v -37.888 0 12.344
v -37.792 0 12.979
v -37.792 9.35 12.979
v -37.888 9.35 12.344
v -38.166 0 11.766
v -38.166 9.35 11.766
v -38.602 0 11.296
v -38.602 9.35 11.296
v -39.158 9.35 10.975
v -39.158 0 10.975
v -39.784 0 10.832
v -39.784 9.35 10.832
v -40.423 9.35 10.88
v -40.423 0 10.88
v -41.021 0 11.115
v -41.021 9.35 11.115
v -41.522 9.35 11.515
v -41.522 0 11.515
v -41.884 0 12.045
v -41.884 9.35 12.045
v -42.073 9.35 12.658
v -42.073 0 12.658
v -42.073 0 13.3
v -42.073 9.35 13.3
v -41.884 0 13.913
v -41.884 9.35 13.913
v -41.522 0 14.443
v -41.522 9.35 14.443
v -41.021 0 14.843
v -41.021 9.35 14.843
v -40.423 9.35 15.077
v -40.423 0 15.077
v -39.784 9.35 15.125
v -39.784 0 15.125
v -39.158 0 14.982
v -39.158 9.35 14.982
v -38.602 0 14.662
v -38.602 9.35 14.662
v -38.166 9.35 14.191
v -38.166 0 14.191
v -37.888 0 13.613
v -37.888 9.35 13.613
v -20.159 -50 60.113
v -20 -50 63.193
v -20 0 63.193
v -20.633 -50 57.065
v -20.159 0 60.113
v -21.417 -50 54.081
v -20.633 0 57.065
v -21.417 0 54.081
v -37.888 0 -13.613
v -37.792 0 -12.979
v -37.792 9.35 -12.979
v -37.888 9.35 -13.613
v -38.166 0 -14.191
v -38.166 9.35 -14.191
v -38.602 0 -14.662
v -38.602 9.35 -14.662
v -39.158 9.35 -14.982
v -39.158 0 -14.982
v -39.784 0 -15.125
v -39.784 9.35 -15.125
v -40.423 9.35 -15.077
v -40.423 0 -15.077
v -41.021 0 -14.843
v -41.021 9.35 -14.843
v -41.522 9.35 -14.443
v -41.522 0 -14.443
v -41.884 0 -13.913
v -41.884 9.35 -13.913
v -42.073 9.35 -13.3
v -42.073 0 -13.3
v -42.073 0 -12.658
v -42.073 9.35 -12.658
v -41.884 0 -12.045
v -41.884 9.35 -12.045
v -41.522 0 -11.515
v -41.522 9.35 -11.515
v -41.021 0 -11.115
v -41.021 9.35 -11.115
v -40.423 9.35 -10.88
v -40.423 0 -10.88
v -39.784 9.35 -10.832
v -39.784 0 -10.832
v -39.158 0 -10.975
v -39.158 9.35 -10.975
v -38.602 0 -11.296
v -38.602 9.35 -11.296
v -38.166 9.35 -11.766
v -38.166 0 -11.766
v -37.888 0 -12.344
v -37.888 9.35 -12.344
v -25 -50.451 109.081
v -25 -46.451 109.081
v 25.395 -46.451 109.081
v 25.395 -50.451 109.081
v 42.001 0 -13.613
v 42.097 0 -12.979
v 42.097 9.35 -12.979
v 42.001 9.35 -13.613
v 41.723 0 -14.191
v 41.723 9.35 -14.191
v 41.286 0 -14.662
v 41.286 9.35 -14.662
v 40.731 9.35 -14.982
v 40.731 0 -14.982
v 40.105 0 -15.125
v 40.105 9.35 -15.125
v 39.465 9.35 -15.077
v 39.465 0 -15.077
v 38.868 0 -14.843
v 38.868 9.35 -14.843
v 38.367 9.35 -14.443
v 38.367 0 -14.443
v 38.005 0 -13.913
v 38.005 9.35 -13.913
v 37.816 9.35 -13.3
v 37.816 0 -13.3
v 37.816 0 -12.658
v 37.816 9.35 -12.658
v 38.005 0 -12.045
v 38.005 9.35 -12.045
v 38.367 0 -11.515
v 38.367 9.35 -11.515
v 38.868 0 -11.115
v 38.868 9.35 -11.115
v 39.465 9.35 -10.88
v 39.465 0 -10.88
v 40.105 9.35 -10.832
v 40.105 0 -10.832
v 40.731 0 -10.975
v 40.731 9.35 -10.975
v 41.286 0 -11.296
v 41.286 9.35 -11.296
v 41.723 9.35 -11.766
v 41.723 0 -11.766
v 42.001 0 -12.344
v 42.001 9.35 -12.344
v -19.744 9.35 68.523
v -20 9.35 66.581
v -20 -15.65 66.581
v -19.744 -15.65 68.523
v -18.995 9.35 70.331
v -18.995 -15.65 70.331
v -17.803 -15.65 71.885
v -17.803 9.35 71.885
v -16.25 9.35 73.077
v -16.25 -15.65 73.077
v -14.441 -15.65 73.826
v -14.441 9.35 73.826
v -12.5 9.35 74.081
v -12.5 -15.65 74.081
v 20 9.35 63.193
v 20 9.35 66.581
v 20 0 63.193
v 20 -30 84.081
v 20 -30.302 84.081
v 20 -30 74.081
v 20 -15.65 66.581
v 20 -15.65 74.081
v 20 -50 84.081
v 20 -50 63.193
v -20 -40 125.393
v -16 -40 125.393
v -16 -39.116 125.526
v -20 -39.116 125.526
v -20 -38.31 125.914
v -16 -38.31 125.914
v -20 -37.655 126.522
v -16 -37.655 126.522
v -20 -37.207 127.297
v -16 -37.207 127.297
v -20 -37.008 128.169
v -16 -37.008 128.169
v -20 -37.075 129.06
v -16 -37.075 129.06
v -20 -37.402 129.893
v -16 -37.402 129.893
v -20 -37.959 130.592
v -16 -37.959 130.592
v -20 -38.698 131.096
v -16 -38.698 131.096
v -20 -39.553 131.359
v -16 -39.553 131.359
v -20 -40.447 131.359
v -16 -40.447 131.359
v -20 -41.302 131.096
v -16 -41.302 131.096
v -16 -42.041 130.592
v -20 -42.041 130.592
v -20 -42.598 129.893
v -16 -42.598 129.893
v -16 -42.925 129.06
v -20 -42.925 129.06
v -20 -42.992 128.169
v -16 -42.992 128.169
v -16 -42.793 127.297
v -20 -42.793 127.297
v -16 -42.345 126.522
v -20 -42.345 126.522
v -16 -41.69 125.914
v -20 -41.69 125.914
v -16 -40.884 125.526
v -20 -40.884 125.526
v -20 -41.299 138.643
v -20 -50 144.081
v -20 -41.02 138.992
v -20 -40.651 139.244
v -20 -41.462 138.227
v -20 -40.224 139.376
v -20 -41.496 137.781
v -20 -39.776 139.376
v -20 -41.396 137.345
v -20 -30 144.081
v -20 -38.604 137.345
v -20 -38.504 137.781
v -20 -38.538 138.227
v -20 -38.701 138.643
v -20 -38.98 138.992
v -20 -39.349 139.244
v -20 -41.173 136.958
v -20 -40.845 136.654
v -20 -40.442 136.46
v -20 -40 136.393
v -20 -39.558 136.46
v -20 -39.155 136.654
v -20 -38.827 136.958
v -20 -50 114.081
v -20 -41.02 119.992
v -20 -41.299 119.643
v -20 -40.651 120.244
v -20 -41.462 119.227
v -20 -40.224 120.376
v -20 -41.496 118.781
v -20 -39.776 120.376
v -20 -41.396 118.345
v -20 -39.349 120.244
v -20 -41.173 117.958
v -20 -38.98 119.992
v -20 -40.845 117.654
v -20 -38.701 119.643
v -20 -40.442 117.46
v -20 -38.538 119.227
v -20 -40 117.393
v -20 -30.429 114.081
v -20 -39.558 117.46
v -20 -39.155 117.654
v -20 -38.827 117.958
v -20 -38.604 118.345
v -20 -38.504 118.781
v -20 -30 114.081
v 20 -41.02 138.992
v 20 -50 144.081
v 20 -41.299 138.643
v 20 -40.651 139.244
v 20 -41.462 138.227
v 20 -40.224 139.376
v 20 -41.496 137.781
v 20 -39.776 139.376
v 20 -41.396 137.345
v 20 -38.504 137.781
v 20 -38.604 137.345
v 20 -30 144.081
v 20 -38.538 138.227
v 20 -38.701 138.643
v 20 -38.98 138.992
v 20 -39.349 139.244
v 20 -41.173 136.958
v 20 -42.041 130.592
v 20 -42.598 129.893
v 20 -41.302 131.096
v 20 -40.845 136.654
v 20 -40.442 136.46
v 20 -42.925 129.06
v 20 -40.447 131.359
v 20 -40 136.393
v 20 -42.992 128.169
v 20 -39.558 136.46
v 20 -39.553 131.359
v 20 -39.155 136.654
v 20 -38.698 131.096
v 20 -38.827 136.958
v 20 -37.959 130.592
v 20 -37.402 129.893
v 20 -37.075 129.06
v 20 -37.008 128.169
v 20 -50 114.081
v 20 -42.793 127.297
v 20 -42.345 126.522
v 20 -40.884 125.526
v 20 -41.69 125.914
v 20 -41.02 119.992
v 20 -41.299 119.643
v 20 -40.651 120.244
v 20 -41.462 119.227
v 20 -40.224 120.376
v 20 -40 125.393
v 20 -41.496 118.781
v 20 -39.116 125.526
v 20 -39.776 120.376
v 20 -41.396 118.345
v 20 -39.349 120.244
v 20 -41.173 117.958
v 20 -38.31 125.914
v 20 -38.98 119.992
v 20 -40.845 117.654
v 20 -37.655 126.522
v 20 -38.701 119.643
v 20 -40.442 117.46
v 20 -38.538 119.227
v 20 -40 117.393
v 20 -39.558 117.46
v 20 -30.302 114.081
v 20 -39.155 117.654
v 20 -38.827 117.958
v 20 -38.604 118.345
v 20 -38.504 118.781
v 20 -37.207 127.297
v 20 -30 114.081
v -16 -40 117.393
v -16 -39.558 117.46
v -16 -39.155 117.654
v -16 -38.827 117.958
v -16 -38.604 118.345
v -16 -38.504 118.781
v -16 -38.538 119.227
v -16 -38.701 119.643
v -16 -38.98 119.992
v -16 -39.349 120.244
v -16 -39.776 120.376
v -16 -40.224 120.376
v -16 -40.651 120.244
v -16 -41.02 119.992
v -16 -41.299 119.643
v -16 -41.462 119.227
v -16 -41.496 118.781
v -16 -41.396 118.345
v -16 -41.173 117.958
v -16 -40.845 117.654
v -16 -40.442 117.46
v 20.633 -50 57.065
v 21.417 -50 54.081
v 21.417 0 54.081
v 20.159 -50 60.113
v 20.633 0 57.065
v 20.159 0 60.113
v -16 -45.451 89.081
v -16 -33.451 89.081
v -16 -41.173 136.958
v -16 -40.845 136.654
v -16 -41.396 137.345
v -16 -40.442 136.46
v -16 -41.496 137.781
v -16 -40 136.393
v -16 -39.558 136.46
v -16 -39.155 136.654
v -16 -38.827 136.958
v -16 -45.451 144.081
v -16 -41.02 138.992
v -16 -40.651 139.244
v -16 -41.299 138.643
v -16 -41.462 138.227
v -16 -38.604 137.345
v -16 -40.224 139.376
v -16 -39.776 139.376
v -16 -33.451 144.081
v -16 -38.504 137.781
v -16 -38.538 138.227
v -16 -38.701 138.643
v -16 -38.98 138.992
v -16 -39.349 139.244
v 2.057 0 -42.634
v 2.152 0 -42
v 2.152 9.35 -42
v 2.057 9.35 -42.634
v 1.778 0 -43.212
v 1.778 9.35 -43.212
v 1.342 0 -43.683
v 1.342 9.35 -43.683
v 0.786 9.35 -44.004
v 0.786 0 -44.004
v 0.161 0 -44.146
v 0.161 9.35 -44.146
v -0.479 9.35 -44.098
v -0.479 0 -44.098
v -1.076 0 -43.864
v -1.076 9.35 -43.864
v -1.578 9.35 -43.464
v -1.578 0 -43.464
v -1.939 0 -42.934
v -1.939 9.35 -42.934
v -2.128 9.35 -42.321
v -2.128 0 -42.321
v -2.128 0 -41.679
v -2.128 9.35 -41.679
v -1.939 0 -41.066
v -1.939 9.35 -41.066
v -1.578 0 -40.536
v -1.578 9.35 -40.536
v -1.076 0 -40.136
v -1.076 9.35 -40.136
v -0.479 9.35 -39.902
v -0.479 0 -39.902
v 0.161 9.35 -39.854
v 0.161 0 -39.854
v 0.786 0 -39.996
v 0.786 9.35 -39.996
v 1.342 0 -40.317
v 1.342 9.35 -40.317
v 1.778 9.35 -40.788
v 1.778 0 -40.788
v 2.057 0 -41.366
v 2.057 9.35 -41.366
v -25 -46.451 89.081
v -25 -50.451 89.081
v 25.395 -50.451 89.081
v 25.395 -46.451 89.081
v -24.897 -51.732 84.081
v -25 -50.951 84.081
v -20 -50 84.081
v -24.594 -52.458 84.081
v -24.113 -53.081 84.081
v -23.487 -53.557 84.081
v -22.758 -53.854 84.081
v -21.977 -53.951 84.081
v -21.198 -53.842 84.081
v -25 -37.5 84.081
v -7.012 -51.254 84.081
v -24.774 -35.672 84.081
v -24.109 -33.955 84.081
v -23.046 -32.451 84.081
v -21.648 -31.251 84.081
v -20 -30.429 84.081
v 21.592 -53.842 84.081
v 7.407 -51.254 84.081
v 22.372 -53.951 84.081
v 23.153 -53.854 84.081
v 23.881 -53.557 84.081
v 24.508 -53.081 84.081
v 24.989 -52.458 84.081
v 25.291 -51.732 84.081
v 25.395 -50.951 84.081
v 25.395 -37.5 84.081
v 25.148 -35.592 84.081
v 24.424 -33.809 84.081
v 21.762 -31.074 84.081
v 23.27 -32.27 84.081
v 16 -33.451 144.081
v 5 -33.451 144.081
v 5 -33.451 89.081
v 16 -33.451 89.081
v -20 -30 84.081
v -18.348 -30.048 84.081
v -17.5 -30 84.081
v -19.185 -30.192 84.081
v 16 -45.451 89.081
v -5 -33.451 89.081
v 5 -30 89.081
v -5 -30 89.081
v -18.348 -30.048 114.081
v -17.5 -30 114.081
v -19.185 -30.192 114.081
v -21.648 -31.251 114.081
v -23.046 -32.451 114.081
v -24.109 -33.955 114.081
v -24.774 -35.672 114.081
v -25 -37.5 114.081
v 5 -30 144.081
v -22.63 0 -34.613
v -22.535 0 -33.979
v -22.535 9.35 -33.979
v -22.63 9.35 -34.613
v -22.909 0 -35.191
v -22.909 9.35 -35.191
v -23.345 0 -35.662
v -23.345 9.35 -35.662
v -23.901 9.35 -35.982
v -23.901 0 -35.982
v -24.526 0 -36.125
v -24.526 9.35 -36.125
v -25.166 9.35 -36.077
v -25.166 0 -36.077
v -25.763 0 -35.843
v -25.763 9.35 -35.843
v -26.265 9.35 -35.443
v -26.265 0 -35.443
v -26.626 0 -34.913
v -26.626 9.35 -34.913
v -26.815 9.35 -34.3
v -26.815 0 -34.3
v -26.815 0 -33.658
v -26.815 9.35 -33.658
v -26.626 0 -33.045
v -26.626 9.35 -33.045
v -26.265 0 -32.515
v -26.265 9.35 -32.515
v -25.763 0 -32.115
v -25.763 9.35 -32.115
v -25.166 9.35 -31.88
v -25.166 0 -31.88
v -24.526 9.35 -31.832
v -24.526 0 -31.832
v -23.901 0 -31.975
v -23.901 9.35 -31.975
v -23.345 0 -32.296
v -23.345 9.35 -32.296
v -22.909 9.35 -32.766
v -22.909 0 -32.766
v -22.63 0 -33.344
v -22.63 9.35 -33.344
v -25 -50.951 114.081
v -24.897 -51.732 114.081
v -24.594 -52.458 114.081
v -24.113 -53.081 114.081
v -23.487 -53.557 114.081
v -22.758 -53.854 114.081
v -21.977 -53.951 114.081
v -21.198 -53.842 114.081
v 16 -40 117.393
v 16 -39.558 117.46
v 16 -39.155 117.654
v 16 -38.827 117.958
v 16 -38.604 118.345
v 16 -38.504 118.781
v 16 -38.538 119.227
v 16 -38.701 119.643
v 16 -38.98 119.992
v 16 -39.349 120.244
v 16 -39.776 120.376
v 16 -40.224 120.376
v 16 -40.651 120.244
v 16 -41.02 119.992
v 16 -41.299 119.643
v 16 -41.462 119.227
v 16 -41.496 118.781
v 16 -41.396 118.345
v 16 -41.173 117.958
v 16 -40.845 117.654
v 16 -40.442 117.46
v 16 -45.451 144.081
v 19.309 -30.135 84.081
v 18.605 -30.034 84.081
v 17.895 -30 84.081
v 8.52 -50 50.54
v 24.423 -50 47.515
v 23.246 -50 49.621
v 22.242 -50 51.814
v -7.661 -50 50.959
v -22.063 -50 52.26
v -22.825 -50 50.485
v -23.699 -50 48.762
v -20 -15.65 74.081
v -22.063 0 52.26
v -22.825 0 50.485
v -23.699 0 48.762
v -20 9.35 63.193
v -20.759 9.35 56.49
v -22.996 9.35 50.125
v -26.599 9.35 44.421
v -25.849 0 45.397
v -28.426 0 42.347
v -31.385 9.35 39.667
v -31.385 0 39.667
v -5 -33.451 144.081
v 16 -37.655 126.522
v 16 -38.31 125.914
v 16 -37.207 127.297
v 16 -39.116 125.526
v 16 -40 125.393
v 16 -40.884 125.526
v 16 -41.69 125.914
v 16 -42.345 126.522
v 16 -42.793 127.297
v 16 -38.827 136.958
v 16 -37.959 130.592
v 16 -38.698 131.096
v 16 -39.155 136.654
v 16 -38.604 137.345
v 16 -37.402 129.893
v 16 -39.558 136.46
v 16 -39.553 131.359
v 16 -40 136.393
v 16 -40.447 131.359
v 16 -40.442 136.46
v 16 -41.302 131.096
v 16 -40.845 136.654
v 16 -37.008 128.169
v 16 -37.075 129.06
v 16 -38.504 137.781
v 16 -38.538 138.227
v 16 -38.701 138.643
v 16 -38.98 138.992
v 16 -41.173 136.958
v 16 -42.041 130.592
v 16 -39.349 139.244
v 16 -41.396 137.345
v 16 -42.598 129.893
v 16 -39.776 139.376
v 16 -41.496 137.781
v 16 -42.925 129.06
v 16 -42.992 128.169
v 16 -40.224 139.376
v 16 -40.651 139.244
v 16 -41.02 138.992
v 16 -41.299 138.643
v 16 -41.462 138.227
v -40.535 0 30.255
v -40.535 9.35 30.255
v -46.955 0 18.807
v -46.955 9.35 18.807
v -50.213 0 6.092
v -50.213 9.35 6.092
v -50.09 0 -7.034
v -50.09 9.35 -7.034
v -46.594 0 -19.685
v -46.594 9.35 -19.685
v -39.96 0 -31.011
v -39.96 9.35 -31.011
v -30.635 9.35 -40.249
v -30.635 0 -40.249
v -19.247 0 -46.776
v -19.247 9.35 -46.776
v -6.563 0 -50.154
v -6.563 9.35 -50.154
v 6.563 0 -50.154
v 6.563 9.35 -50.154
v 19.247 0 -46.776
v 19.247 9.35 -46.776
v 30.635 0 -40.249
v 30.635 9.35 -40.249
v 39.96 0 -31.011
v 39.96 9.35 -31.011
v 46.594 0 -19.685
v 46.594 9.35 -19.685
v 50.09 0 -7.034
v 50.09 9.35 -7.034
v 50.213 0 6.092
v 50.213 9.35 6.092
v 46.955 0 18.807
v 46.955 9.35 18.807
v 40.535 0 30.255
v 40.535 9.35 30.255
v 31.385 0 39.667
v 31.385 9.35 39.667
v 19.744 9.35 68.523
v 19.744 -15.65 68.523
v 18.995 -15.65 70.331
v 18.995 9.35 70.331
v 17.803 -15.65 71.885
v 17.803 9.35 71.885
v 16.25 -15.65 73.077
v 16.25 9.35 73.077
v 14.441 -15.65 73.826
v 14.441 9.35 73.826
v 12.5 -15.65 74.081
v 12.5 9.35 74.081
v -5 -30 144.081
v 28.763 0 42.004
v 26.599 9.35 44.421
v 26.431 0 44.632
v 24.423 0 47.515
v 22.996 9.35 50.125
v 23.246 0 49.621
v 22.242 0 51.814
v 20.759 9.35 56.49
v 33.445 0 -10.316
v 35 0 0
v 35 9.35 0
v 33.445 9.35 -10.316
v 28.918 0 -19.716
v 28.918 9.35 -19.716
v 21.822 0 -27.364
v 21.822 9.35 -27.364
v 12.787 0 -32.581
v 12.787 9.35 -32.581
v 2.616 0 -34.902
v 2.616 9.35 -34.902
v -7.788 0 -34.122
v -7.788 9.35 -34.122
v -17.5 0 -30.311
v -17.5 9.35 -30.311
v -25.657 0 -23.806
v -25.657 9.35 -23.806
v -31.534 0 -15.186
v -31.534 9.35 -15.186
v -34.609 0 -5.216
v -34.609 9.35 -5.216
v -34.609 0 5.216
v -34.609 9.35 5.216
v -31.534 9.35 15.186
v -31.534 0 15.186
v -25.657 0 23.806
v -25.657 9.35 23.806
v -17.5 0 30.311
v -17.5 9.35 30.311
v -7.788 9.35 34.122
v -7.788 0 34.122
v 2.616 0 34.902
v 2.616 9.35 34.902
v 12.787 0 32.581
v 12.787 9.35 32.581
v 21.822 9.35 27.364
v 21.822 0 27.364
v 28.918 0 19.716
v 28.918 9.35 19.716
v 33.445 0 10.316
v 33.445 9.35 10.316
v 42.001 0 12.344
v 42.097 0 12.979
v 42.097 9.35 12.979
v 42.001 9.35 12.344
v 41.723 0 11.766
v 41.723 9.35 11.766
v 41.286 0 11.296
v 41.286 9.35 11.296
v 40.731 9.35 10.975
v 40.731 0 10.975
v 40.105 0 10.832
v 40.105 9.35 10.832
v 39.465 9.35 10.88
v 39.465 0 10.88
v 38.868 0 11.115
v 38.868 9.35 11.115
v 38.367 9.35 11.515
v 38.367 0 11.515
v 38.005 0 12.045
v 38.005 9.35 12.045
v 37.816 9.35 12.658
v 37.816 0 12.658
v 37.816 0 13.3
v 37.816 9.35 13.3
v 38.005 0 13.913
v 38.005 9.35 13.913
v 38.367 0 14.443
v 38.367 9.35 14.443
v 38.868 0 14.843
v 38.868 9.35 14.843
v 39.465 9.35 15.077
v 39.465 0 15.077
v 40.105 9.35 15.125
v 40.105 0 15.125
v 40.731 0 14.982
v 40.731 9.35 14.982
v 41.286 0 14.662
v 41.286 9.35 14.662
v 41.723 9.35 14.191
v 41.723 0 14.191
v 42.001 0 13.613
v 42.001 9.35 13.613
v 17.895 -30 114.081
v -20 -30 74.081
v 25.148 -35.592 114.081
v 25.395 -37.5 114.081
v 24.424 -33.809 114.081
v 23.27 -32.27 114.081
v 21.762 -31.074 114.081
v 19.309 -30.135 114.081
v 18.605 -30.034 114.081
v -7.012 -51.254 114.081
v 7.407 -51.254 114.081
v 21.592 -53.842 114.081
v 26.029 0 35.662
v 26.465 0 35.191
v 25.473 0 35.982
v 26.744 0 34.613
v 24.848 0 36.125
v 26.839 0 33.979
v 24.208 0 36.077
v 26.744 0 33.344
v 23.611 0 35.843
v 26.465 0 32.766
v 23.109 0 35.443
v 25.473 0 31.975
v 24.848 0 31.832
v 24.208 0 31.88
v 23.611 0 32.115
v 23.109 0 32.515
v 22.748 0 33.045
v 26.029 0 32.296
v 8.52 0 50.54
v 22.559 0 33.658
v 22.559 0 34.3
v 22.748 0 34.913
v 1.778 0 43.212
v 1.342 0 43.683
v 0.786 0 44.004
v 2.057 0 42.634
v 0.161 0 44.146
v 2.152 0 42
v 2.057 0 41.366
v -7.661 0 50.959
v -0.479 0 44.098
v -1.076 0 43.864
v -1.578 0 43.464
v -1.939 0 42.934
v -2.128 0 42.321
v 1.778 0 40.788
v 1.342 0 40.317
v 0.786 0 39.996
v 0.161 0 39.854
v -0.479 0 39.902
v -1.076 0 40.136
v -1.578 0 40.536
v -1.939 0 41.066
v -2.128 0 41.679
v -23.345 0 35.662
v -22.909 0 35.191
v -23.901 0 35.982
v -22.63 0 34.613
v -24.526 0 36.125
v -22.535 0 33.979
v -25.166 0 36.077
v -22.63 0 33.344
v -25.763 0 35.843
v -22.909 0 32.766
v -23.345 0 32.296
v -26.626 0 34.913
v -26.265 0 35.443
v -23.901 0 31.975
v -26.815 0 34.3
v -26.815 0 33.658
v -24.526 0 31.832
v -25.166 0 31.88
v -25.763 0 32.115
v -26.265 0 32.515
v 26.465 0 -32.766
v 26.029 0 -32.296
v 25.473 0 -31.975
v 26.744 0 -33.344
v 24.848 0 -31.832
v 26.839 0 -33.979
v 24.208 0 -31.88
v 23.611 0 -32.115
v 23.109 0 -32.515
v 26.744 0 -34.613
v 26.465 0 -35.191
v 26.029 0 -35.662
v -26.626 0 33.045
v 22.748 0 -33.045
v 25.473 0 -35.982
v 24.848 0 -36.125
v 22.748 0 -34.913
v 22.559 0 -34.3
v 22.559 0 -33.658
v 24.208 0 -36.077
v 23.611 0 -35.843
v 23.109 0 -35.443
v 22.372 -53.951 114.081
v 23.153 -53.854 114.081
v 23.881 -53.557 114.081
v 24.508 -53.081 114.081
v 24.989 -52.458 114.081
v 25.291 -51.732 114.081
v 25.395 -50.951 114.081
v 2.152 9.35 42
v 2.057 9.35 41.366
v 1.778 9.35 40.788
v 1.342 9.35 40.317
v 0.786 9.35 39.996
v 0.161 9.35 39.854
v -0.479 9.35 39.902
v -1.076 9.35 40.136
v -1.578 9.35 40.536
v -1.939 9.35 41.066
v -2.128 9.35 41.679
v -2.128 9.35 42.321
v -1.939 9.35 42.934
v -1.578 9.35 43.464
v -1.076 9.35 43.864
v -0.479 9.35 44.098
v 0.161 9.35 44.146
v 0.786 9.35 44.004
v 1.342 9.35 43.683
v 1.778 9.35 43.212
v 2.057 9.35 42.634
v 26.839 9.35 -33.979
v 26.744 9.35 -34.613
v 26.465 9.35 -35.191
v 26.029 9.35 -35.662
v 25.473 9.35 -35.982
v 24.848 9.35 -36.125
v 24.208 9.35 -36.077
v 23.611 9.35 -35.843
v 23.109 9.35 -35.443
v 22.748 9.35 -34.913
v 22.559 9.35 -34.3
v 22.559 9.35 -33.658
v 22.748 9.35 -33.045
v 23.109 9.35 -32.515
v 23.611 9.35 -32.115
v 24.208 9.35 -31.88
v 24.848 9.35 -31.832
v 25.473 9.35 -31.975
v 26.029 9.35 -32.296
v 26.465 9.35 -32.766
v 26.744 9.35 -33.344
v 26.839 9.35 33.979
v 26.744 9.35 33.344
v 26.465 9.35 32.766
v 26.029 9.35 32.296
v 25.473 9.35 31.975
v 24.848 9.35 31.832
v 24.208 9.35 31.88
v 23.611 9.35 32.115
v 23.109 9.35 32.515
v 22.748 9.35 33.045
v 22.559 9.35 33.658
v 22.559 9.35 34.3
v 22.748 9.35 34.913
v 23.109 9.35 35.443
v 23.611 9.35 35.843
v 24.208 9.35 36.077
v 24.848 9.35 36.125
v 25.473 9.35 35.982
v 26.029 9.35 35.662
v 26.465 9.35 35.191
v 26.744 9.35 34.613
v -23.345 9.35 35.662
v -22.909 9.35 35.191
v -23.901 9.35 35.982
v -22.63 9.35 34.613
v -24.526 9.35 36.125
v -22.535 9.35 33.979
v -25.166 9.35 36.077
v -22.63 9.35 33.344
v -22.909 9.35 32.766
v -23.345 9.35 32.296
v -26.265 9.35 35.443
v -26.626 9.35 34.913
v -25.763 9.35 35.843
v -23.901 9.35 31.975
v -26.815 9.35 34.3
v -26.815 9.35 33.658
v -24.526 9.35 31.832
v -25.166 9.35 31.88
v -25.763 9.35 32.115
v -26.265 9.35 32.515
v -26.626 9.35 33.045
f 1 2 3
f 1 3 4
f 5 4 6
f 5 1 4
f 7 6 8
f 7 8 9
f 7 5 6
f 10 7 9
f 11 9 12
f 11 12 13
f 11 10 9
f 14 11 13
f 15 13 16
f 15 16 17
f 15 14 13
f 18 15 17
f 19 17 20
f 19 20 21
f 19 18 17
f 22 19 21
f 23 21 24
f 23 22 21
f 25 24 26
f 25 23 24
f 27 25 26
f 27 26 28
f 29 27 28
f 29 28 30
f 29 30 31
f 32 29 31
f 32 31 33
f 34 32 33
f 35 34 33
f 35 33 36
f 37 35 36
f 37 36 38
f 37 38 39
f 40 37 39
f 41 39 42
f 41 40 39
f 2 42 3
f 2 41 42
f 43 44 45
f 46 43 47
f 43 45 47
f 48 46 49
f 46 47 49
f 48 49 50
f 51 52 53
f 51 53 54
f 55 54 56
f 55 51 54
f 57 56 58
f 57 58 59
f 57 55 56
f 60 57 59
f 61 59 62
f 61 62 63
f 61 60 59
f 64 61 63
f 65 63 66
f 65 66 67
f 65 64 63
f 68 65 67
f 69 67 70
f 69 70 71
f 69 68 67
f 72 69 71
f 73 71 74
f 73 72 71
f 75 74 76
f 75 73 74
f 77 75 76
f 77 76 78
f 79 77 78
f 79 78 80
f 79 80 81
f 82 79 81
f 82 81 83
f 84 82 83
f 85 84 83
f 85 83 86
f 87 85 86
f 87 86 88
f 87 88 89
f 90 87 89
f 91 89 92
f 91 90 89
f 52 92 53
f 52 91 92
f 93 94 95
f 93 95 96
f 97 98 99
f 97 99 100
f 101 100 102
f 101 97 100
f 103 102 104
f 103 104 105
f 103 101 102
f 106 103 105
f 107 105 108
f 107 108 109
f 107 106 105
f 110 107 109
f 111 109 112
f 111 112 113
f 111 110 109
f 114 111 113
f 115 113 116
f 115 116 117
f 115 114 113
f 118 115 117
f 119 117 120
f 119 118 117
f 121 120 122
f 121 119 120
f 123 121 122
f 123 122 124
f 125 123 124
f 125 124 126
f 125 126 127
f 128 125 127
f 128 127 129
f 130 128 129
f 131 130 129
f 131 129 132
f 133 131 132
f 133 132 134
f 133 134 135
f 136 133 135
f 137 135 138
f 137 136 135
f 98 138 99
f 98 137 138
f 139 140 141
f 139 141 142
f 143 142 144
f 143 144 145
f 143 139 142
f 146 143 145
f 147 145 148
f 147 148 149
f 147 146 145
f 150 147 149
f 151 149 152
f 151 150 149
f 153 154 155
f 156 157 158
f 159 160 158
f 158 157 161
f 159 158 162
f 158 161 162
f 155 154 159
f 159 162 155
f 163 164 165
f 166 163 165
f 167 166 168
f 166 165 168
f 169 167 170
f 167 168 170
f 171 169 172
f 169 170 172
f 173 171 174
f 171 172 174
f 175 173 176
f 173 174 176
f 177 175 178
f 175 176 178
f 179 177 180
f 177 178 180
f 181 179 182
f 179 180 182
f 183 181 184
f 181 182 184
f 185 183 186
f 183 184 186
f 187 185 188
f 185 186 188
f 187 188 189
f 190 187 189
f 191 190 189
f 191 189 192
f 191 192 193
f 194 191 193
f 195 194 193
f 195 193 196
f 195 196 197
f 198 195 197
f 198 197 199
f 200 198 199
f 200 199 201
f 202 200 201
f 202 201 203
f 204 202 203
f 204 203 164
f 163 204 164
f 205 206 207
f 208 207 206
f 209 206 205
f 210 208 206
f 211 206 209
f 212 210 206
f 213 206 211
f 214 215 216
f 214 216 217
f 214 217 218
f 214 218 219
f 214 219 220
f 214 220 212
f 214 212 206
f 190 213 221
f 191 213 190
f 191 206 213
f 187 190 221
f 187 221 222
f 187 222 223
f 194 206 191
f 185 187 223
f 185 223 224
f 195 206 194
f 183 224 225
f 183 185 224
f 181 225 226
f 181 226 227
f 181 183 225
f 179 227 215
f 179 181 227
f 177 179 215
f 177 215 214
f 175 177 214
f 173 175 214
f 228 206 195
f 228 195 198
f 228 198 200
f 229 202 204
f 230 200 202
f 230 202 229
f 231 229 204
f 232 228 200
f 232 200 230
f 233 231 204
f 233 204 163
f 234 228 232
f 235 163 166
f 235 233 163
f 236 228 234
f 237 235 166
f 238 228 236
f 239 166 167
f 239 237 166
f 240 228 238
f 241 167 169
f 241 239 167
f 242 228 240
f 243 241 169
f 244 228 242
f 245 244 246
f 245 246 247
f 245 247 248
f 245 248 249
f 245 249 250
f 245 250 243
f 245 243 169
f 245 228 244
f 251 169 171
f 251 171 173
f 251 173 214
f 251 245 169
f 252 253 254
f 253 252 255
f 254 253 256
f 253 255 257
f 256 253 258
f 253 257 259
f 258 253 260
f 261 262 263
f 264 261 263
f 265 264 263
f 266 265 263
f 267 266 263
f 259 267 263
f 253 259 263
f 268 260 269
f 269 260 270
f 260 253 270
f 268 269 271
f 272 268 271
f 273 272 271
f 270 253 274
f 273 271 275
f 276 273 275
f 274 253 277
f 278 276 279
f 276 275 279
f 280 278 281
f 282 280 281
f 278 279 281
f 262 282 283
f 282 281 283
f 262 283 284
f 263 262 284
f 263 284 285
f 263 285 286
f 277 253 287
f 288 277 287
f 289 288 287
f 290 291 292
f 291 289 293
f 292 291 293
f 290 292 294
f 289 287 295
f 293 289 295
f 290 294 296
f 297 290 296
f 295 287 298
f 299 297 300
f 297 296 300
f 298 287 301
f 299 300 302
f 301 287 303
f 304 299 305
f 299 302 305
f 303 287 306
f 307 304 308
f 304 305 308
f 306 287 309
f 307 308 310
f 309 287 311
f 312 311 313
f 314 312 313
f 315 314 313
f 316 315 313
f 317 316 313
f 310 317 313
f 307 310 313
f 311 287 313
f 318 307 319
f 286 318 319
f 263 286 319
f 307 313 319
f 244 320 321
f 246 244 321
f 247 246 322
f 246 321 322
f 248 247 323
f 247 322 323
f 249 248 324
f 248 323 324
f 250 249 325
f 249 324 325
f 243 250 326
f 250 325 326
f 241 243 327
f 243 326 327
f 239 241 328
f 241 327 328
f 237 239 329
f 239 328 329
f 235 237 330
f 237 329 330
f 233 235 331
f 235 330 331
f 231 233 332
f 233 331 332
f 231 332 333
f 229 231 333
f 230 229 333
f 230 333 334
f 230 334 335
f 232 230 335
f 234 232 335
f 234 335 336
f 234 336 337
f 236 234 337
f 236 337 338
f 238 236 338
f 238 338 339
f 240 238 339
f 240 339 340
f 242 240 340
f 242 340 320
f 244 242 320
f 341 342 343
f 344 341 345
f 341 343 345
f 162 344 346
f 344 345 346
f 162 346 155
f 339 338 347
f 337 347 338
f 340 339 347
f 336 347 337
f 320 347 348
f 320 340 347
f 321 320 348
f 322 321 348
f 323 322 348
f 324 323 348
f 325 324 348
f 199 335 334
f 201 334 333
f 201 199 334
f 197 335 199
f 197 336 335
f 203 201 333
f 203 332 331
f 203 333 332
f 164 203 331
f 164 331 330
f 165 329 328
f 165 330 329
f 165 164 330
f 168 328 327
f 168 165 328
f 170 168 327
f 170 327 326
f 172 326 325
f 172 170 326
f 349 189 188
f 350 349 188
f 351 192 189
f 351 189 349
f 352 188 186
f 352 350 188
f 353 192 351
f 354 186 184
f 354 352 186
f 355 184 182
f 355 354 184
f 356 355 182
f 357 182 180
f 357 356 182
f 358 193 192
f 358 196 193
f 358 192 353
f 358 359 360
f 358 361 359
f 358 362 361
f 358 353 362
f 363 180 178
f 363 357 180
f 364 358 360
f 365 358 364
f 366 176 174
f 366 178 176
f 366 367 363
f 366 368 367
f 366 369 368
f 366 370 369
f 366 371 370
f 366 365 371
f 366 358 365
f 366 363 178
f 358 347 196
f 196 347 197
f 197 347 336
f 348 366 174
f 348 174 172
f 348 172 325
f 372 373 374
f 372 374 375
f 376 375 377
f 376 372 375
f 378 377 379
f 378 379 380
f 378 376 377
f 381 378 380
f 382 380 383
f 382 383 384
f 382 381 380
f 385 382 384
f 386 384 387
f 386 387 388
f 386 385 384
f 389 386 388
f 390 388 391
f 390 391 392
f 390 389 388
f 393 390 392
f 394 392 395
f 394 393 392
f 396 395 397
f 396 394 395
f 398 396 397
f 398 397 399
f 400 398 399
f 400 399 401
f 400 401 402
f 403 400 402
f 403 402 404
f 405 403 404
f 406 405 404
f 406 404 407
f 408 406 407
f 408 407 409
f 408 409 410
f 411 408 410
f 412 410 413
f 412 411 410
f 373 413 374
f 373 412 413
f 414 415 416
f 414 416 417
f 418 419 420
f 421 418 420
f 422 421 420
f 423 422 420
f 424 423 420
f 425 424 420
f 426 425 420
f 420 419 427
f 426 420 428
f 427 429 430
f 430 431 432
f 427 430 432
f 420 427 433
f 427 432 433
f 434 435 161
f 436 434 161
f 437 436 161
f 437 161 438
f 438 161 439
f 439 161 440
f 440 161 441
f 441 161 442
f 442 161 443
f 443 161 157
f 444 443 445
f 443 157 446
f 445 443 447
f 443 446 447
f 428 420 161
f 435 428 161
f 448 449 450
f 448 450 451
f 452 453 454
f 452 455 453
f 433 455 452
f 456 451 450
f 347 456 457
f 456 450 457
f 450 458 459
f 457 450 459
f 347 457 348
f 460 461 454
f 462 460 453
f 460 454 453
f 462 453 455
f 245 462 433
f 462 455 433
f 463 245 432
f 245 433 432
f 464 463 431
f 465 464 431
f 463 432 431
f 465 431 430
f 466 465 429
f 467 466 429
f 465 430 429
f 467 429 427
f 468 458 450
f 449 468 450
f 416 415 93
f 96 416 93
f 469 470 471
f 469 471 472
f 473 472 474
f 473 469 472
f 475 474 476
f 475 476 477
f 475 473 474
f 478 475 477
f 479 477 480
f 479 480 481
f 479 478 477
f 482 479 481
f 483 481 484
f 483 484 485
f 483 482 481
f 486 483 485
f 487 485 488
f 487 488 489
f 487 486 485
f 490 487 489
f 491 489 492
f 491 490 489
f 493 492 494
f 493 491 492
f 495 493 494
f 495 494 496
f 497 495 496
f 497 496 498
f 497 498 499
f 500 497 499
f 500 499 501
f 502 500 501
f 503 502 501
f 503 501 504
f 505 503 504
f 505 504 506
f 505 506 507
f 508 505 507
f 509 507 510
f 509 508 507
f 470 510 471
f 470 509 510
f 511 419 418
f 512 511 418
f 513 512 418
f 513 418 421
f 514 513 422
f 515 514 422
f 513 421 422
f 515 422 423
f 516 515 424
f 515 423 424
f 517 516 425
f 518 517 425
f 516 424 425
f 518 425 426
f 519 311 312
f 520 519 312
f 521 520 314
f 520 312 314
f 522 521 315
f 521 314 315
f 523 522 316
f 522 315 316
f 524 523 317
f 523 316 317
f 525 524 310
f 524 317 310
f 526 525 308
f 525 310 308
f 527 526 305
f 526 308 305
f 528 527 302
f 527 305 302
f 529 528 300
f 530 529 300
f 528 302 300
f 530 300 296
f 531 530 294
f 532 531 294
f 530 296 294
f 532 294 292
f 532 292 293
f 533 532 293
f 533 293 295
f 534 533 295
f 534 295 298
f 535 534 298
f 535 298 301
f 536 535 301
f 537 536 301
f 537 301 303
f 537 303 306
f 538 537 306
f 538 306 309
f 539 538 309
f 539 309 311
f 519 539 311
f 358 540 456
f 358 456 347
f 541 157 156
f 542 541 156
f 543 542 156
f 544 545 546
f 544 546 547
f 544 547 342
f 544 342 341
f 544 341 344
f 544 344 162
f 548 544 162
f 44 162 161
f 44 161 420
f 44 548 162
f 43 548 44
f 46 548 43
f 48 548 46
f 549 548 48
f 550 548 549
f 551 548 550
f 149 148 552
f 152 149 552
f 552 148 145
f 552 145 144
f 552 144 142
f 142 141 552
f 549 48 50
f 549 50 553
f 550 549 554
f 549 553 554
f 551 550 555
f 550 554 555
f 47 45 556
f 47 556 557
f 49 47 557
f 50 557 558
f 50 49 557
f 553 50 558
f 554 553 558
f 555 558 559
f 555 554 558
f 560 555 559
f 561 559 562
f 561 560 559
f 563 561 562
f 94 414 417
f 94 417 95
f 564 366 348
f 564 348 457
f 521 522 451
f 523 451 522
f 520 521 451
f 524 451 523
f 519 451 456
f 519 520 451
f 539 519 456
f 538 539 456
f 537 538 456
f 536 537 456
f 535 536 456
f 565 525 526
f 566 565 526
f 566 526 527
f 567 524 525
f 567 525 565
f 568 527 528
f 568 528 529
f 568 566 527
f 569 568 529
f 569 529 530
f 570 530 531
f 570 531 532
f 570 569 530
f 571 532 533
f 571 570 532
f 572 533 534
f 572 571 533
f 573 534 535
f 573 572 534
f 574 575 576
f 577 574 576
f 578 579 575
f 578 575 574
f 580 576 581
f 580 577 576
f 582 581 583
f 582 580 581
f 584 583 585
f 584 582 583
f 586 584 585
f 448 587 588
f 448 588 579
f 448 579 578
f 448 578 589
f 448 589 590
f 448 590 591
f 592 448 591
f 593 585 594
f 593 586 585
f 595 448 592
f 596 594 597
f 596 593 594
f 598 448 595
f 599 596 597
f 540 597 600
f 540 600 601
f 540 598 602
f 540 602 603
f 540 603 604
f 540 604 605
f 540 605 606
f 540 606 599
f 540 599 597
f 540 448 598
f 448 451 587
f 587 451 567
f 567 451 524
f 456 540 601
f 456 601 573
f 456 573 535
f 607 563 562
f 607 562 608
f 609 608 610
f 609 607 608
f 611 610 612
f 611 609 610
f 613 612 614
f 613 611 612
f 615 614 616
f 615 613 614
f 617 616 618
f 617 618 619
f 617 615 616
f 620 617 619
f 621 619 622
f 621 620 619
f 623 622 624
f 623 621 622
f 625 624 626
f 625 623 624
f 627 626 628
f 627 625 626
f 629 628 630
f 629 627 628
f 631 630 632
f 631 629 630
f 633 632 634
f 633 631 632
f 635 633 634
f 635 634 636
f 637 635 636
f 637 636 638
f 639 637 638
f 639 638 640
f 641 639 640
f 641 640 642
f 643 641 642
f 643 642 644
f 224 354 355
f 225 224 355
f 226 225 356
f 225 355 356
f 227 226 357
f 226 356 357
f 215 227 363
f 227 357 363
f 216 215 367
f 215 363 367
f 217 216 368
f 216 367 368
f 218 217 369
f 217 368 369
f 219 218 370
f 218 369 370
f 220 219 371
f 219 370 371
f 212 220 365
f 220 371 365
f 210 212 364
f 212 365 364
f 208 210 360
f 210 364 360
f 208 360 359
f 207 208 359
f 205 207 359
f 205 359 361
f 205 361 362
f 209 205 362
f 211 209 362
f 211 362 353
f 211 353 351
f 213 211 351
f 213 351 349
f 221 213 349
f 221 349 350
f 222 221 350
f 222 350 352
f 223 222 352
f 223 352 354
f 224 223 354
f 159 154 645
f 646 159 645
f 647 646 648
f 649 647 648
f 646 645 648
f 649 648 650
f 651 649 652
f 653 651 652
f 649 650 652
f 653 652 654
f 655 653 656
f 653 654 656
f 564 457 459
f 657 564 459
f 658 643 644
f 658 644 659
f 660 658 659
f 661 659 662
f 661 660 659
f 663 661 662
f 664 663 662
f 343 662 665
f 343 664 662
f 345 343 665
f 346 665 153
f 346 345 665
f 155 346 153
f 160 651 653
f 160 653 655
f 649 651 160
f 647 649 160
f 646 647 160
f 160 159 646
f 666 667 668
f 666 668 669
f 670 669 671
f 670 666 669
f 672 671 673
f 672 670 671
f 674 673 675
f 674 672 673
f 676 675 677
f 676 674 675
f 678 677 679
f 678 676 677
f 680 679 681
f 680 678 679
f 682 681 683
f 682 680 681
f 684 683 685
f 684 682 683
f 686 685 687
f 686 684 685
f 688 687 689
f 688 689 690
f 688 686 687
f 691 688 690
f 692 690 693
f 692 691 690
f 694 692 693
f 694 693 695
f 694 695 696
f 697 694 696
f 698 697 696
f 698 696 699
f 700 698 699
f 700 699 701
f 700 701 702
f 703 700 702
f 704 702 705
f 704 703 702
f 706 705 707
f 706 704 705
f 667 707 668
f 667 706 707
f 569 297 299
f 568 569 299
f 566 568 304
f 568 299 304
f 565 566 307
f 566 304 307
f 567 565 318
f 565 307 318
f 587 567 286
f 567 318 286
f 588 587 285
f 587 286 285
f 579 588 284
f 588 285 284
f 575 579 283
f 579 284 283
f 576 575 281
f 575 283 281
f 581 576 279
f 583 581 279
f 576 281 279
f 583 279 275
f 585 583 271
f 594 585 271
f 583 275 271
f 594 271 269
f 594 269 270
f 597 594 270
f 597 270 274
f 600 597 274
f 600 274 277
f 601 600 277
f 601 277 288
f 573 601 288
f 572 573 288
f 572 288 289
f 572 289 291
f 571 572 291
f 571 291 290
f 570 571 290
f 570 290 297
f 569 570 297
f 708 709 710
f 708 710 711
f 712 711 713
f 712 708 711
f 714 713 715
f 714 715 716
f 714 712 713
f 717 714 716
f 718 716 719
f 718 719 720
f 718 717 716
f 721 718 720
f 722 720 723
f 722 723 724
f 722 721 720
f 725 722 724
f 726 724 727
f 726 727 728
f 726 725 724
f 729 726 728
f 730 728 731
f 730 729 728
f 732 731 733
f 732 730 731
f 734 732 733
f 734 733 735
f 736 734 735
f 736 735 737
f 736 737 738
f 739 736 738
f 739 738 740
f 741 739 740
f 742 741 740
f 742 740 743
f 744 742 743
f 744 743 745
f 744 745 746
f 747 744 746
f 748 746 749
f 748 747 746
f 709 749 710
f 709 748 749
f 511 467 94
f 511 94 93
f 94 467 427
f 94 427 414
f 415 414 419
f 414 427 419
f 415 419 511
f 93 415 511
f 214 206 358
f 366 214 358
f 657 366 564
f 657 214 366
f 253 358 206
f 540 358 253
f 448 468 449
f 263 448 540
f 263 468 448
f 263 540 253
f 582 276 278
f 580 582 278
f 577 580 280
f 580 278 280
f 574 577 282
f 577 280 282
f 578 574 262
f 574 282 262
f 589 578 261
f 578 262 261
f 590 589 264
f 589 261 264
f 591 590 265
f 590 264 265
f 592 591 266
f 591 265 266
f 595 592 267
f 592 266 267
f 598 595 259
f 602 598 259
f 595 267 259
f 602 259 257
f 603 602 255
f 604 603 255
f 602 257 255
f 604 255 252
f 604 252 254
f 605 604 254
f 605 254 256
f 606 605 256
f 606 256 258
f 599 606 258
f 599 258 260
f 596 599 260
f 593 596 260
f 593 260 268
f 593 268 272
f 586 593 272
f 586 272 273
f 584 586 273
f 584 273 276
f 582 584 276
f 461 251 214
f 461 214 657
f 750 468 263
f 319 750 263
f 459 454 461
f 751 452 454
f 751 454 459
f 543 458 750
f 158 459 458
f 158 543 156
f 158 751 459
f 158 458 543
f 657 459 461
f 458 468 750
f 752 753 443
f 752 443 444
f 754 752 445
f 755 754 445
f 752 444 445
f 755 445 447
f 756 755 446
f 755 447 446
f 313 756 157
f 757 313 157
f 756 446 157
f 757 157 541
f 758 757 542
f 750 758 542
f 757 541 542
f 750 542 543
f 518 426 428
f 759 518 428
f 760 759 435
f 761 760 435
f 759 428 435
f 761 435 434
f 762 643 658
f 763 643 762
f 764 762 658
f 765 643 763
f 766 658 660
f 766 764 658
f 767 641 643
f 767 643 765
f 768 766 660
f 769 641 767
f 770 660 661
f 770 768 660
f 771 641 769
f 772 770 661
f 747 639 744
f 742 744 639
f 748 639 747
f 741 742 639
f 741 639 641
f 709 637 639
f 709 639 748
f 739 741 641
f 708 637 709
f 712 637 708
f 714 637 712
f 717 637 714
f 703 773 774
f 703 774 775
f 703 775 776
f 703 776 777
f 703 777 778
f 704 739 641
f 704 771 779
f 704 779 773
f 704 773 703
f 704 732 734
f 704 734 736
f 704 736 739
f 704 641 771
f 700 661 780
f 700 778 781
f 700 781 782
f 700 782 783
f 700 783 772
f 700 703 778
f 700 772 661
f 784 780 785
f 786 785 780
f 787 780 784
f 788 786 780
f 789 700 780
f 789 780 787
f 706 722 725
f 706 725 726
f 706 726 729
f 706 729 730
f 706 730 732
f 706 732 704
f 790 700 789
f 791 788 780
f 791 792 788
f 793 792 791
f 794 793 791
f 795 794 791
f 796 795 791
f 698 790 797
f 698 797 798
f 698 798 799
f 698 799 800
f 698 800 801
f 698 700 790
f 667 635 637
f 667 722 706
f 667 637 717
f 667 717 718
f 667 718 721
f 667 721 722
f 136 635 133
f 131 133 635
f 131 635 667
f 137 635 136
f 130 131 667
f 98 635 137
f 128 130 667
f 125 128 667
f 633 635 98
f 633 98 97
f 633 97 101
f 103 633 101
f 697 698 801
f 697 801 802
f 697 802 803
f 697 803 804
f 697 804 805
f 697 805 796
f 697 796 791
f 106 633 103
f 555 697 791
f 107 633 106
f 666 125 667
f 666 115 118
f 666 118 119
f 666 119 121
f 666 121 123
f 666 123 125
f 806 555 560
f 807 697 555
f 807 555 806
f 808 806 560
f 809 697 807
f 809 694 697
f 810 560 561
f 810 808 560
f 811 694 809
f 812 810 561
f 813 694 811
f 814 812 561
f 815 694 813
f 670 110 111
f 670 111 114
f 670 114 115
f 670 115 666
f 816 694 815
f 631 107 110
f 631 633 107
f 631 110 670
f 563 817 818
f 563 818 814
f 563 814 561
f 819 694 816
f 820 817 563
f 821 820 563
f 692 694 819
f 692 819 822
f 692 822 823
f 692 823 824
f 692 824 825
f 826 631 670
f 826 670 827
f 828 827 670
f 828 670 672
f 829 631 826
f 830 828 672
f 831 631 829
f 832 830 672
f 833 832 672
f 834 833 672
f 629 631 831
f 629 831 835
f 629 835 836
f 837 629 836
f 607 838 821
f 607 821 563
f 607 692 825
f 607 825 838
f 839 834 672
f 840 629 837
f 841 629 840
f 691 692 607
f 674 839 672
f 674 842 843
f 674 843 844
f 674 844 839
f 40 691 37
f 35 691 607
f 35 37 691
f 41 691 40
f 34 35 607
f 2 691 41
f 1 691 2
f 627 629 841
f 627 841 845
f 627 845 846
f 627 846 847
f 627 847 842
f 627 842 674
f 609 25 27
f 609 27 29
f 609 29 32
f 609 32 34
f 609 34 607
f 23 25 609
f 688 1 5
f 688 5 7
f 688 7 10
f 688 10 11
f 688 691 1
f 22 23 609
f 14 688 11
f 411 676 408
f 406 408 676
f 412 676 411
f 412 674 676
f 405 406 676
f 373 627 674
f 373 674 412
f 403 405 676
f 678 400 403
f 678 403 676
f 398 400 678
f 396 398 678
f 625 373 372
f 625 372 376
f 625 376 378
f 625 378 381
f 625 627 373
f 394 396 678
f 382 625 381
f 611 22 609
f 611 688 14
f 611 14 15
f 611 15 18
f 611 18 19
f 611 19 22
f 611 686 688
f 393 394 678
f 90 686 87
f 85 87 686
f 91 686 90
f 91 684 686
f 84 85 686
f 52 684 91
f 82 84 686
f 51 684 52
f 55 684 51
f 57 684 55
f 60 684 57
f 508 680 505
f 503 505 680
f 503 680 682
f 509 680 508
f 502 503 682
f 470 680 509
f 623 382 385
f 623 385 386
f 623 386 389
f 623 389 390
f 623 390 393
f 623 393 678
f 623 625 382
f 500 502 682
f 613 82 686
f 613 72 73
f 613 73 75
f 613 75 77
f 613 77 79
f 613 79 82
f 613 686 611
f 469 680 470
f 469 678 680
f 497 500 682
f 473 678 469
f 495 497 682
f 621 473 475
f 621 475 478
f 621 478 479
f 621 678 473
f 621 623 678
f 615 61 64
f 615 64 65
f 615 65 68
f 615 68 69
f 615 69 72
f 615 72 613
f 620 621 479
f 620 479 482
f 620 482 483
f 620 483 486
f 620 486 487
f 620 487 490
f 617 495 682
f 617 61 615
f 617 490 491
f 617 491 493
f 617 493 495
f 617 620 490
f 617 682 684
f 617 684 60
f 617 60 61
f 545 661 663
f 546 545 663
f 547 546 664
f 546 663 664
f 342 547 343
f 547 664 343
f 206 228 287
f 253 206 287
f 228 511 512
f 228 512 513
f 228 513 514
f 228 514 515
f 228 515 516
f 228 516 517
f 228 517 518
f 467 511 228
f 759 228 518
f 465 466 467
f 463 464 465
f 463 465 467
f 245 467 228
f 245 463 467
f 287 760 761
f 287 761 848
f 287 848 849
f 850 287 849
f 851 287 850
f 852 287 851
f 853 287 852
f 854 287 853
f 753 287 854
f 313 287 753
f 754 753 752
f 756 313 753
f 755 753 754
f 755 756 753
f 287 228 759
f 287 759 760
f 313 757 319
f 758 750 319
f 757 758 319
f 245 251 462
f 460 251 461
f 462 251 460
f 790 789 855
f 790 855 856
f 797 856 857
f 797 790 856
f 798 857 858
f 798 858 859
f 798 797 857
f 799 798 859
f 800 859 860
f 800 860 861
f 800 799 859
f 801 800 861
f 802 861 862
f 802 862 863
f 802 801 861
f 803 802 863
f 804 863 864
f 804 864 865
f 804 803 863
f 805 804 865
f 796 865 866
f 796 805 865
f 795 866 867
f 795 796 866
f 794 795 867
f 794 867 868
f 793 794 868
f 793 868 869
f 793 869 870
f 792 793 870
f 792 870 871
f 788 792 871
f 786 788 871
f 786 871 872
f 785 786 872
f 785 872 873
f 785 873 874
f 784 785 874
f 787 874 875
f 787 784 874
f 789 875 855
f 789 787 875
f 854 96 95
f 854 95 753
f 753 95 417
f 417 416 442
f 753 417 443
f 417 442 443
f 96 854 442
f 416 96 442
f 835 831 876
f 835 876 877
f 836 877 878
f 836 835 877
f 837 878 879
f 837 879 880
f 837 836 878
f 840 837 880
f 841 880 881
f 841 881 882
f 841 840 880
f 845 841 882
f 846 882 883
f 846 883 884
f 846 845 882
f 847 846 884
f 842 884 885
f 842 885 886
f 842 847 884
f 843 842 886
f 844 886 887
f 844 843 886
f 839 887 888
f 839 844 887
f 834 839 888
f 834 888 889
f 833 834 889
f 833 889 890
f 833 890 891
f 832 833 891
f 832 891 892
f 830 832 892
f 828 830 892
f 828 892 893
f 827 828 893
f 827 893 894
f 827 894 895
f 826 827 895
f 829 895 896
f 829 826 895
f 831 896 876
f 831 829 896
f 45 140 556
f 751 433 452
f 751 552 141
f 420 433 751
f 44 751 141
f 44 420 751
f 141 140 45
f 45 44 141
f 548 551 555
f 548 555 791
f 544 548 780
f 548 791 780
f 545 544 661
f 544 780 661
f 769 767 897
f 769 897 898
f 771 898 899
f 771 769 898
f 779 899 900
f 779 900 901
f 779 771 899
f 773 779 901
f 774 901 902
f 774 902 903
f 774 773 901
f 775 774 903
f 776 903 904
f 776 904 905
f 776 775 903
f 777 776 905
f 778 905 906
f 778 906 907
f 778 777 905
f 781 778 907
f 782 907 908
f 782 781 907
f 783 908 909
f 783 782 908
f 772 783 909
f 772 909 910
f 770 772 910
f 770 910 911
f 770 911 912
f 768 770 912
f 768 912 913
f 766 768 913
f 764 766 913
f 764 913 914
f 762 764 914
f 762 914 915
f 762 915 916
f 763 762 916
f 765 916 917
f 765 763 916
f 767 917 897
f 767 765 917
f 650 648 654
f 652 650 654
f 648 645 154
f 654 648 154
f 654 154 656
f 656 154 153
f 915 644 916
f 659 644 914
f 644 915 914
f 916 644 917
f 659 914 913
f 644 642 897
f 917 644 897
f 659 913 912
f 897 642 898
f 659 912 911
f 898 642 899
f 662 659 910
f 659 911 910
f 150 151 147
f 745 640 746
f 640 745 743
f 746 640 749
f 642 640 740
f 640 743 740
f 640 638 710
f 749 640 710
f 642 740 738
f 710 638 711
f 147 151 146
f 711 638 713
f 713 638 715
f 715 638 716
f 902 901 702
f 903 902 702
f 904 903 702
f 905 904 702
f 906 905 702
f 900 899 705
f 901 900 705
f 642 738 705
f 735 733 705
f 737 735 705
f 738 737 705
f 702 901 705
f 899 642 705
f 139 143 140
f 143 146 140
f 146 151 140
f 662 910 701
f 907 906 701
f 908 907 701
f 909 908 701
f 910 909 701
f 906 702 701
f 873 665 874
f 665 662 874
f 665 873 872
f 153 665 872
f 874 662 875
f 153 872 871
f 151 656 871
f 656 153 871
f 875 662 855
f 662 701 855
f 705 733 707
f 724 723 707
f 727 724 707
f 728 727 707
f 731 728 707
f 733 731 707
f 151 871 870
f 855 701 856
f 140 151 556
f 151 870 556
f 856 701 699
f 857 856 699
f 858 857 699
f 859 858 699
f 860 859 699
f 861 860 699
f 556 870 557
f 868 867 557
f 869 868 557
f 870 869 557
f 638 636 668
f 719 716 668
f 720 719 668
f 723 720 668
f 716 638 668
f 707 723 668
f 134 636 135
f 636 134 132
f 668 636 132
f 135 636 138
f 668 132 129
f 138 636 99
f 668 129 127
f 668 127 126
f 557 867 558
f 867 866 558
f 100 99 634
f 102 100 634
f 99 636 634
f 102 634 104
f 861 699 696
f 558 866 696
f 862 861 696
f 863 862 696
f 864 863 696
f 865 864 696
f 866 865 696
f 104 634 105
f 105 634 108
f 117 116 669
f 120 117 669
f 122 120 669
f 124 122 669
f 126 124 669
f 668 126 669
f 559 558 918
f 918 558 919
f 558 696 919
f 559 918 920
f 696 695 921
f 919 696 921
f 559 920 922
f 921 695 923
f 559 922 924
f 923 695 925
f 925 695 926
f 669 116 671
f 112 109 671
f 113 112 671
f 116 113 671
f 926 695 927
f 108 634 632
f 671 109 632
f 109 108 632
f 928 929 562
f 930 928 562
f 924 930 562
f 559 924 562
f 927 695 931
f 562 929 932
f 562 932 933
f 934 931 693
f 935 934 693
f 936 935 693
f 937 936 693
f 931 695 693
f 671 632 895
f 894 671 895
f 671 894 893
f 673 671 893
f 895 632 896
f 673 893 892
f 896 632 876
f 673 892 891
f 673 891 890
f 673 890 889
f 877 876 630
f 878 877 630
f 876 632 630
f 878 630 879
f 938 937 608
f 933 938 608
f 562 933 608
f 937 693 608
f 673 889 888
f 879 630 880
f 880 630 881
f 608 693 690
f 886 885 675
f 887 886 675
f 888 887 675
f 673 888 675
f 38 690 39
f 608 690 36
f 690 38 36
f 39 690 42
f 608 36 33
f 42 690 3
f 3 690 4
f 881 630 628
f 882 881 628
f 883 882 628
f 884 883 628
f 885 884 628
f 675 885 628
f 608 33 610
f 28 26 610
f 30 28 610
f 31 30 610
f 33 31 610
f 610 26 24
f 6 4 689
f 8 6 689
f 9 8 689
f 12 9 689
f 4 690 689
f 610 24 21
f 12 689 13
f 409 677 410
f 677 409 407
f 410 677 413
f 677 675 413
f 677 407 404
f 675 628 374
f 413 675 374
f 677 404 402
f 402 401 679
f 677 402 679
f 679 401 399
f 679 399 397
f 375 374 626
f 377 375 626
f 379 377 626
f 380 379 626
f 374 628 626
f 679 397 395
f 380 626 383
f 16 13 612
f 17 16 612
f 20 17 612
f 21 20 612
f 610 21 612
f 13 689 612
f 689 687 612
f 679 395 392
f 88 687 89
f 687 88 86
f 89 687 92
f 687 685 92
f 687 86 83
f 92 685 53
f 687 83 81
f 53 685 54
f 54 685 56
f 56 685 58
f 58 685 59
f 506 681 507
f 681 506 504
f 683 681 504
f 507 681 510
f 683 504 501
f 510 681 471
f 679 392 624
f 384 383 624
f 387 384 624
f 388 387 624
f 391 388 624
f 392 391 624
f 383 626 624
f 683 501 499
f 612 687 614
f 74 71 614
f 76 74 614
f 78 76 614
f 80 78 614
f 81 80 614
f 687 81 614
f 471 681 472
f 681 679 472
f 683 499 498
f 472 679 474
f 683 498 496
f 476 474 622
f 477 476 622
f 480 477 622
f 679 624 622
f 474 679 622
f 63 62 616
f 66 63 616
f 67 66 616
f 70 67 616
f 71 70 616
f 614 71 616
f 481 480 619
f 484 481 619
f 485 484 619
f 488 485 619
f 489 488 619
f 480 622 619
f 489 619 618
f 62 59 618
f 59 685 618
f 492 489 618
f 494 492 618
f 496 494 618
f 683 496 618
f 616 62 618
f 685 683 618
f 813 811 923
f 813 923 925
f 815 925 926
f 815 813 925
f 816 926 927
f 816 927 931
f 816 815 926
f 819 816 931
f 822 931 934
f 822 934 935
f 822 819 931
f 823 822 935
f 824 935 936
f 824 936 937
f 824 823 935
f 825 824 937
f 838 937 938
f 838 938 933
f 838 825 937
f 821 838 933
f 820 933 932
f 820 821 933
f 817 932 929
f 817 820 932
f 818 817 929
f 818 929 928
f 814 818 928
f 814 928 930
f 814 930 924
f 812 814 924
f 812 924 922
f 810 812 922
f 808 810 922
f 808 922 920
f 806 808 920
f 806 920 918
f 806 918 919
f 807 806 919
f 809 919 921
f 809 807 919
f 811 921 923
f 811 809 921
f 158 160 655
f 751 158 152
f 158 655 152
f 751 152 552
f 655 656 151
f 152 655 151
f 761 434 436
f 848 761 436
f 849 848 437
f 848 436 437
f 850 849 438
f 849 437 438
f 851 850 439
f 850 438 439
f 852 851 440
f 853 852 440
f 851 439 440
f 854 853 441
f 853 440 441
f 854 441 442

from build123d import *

# Parameters (mm, degrees)
SKETCH2_R           = 2.152402862
SKETCH2_R_2         = 35
BOSS_EXTRUDE2_DEPTH = 9.35
BOSS_EXTRUDE3_DEPTH = 50
CUT_EXTRUDE2_DEPTH  = 25
SKETCH8_W           = 40
SKETCH8_H           = 10
BOSS_EXTRUDE4_DEPTH = 20
BOSS_EXTRUDE5_DEPTH = 30
CUT_EXTRUDE4_DEPTH  = 56
SKETCH15_W          = 40
SKETCH15_H          = 20
BOSS_EXTRUDE6_DEPTH = 30
CUT_EXTRUDE5_DEPTH  = 55
SKETCH18_R          = 3
SKETCH18_R_2        = 1.5
CUT_EXTRUDE6_DEPTH  = 42


with BuildPart() as part:
    # Sketch2 → Boss-Extrude2 (new body)
    with BuildSketch(Plane(origin=(0, 0, 0), x_dir=(1, 0, 0), z_dir=(0, 1, 0))):
        with BuildLine():
            Line((-20, -74.081467259), (-20, -63.193139387))
            ThreePointArc((-20, -63.193139387), (-22.995916419, -50.124877454), (-31.385297997, -39.66671022))
            ThreePointArc((-31.385297997, -39.66671022), (0, 50.581467259), (31.385297997, -39.66671022))
            ThreePointArc((31.385297997, -39.66671022), (22.995916419, -50.124877454), (20, -63.193139387))
            Line((20, -63.193139387), (20, -74.081467259))
            Line((20, -74.081467259), (-20, -74.081467259))
        make_face()
        with Locations((0, 42)):
            Circle(SKETCH2_R, mode=Mode.SUBTRACT)
        with Locations((24.686980596, 33.978713764)):
            Circle(SKETCH2_R, mode=Mode.SUBTRACT)
        with Locations((39.944373684, 12.978713764)):
            Circle(SKETCH2_R, mode=Mode.SUBTRACT)
        with Locations((39.944373684, -12.978713764)):
            Circle(SKETCH2_R, mode=Mode.SUBTRACT)
        with Locations((24.686980596, -33.978713764)):
            Circle(SKETCH2_R, mode=Mode.SUBTRACT)
        with Locations((0, -42)):
            Circle(SKETCH2_R, mode=Mode.SUBTRACT)
        with Locations((-24.686980596, -33.978713764)):
            Circle(SKETCH2_R, mode=Mode.SUBTRACT)
        with Locations((-39.944373684, -12.978713764)):
            Circle(SKETCH2_R, mode=Mode.SUBTRACT)
        with Locations((-39.944373684, 12.978713764)):
            Circle(SKETCH2_R, mode=Mode.SUBTRACT)
        with Locations((-24.686980596, 33.978713764)):
            Circle(SKETCH2_R, mode=Mode.SUBTRACT)
        Circle(SKETCH2_R_2, mode=Mode.SUBTRACT)
    extrude(amount=BOSS_EXTRUDE2_DEPTH)

    # Sketch4 → Boss-Extrude3 (add)
    with BuildSketch(Plane.XZ):
        with BuildLine():
            Line((20, 74.081467259), (-20, 74.081467259))
            Line((-20, 74.081467259), (-20, 63.193139387))
            ThreePointArc((-20, 63.193139387), (-20.356412905, 58.582527267), (-21.417182941, 54.081467259))
            ThreePointArc((-21.417182941, 54.081467259), (-22.429520384, 51.366531516), (-23.699050675, 48.761920984))
            ThreePointArc((-23.699050675, 48.761920984), (0.438017323, 51.077240228), (24.422779297, 47.514944939))
            ThreePointArc((24.422779297, 47.514944939), (22.721671121, 50.70743662), (21.417182941, 54.081467259))
            ThreePointArc((21.417182941, 54.081467259), (20.356412905, 58.582527267), (20, 63.193139387))
            Line((20, 63.193139387), (20, 74.081467259))
        make_face()
    extrude(amount=BOSS_EXTRUDE3_DEPTH)

    # Sketch6 → Cut-Extrude2 (cut)
    with BuildSketch(Plane(origin=(0, 9.35, 0), x_dir=(1, 0, 0), z_dir=(0, 1, 0))):
        with BuildLine():
            Line((-12.5, -74.081467259), (-20, -74.081467259))
            Line((-20, -74.081467259), (-20, -66.581467259))
            ThreePointArc((-20, -66.581467259), (-17.803300859, -71.884768118), (-12.5, -74.081467259))
        make_face()
        with BuildLine():
            Line((12.5, -74.081467259), (20, -74.081467259))
            Line((20, -74.081467259), (20, -66.581467259))
            ThreePointArc((20, -66.581467259), (17.803300859, -71.884768118), (12.5, -74.081467259))
        make_face()
    extrude(amount=-CUT_EXTRUDE2_DEPTH, mode=Mode.SUBTRACT)

    # Sketch8 → Boss-Extrude4 (add)
    with BuildSketch(Plane(origin=(0, -50, 0), x_dir=(-1, 0, 0), z_dir=(0, -1, 0))):
        with Locations((0, -79.081467259)):
            Rectangle(SKETCH8_W, SKETCH8_H)
    extrude(amount=-BOSS_EXTRUDE4_DEPTH)

    # Sketch10 → Boss-Extrude5 (add)
    with BuildSketch(Plane.XY.offset(84.081467259)):
        with BuildLine():
            Line((-25, -37.5), (-25, -50.951484801))
            ThreePointArc((-25, -50.951484801), (-23.815635647, -53.339678092), (-21.197688536, -53.842210716))
            ThreePointArc((-21.197688536, -53.842210716), (0.197283847, -50.928235109), (21.59225623, -53.842210716))
            ThreePointArc((21.59225623, -53.842210716), (24.210203342, -53.339678092), (25.394567694, -50.951484801))
            Line((25.394567694, -50.951484801), (25.394567694, -37.5))
            ThreePointArc((25.394567694, -37.5), (23.197868553, -32.196699141), (17.894567694, -30))
            Line((17.894567694, -30), (-17.5, -30))
            ThreePointArc((-17.5, -30), (-22.803300859, -32.196699141), (-25, -37.5))
        make_face()
    extrude(amount=BOSS_EXTRUDE5_DEPTH)

    # Sketch11 → Cut-Extrude4 (cut)
    with BuildSketch(Plane.ZY.offset(25)):
        Polygon((109.081467259, -46.451484801), (109.081467259, -50.451484801), (99.081467259, -50.451484801), (89.081467259, -50.451484801), (89.081467259, -46.451484801), align=None)
    extrude(amount=-CUT_EXTRUDE4_DEPTH, mode=Mode.SUBTRACT)

    # Sketch15 → Boss-Extrude6 (add)
    with BuildSketch(Plane.XY.offset(114.081467259)):
        with Locations((0, -40)):
            Rectangle(SKETCH15_W, SKETCH15_H)
    extrude(amount=BOSS_EXTRUDE6_DEPTH)

    # Sketch17 → Cut-Extrude5 (cut)
    with BuildSketch(Plane.XY.offset(144.081467259)):
        Polygon((5, -30), (5, -33.451484801), (16, -33.451484801), (16, -45.451484801), (-16, -45.451484801), (-16, -33.451484801), (-5, -33.451484801), (-5, -30), align=None)
    extrude(amount=-CUT_EXTRUDE5_DEPTH, mode=Mode.SUBTRACT)

    # Sketch18 → Cut-Extrude6 (cut)
    with BuildSketch(Plane(origin=(20, 0, 0), x_dir=(0, 0, -1), z_dir=(1, 0, 0))):
        with Locations((-128.392898154, -40)):
            Circle(SKETCH18_R)
        with Locations((-118.892898154, -40)):
            Circle(SKETCH18_R_2)
        with Locations((-137.892898154, -40)):
            Circle(SKETCH18_R_2)
    extrude(amount=-CUT_EXTRUDE6_DEPTH, mode=Mode.SUBTRACT)


solid = part.part
